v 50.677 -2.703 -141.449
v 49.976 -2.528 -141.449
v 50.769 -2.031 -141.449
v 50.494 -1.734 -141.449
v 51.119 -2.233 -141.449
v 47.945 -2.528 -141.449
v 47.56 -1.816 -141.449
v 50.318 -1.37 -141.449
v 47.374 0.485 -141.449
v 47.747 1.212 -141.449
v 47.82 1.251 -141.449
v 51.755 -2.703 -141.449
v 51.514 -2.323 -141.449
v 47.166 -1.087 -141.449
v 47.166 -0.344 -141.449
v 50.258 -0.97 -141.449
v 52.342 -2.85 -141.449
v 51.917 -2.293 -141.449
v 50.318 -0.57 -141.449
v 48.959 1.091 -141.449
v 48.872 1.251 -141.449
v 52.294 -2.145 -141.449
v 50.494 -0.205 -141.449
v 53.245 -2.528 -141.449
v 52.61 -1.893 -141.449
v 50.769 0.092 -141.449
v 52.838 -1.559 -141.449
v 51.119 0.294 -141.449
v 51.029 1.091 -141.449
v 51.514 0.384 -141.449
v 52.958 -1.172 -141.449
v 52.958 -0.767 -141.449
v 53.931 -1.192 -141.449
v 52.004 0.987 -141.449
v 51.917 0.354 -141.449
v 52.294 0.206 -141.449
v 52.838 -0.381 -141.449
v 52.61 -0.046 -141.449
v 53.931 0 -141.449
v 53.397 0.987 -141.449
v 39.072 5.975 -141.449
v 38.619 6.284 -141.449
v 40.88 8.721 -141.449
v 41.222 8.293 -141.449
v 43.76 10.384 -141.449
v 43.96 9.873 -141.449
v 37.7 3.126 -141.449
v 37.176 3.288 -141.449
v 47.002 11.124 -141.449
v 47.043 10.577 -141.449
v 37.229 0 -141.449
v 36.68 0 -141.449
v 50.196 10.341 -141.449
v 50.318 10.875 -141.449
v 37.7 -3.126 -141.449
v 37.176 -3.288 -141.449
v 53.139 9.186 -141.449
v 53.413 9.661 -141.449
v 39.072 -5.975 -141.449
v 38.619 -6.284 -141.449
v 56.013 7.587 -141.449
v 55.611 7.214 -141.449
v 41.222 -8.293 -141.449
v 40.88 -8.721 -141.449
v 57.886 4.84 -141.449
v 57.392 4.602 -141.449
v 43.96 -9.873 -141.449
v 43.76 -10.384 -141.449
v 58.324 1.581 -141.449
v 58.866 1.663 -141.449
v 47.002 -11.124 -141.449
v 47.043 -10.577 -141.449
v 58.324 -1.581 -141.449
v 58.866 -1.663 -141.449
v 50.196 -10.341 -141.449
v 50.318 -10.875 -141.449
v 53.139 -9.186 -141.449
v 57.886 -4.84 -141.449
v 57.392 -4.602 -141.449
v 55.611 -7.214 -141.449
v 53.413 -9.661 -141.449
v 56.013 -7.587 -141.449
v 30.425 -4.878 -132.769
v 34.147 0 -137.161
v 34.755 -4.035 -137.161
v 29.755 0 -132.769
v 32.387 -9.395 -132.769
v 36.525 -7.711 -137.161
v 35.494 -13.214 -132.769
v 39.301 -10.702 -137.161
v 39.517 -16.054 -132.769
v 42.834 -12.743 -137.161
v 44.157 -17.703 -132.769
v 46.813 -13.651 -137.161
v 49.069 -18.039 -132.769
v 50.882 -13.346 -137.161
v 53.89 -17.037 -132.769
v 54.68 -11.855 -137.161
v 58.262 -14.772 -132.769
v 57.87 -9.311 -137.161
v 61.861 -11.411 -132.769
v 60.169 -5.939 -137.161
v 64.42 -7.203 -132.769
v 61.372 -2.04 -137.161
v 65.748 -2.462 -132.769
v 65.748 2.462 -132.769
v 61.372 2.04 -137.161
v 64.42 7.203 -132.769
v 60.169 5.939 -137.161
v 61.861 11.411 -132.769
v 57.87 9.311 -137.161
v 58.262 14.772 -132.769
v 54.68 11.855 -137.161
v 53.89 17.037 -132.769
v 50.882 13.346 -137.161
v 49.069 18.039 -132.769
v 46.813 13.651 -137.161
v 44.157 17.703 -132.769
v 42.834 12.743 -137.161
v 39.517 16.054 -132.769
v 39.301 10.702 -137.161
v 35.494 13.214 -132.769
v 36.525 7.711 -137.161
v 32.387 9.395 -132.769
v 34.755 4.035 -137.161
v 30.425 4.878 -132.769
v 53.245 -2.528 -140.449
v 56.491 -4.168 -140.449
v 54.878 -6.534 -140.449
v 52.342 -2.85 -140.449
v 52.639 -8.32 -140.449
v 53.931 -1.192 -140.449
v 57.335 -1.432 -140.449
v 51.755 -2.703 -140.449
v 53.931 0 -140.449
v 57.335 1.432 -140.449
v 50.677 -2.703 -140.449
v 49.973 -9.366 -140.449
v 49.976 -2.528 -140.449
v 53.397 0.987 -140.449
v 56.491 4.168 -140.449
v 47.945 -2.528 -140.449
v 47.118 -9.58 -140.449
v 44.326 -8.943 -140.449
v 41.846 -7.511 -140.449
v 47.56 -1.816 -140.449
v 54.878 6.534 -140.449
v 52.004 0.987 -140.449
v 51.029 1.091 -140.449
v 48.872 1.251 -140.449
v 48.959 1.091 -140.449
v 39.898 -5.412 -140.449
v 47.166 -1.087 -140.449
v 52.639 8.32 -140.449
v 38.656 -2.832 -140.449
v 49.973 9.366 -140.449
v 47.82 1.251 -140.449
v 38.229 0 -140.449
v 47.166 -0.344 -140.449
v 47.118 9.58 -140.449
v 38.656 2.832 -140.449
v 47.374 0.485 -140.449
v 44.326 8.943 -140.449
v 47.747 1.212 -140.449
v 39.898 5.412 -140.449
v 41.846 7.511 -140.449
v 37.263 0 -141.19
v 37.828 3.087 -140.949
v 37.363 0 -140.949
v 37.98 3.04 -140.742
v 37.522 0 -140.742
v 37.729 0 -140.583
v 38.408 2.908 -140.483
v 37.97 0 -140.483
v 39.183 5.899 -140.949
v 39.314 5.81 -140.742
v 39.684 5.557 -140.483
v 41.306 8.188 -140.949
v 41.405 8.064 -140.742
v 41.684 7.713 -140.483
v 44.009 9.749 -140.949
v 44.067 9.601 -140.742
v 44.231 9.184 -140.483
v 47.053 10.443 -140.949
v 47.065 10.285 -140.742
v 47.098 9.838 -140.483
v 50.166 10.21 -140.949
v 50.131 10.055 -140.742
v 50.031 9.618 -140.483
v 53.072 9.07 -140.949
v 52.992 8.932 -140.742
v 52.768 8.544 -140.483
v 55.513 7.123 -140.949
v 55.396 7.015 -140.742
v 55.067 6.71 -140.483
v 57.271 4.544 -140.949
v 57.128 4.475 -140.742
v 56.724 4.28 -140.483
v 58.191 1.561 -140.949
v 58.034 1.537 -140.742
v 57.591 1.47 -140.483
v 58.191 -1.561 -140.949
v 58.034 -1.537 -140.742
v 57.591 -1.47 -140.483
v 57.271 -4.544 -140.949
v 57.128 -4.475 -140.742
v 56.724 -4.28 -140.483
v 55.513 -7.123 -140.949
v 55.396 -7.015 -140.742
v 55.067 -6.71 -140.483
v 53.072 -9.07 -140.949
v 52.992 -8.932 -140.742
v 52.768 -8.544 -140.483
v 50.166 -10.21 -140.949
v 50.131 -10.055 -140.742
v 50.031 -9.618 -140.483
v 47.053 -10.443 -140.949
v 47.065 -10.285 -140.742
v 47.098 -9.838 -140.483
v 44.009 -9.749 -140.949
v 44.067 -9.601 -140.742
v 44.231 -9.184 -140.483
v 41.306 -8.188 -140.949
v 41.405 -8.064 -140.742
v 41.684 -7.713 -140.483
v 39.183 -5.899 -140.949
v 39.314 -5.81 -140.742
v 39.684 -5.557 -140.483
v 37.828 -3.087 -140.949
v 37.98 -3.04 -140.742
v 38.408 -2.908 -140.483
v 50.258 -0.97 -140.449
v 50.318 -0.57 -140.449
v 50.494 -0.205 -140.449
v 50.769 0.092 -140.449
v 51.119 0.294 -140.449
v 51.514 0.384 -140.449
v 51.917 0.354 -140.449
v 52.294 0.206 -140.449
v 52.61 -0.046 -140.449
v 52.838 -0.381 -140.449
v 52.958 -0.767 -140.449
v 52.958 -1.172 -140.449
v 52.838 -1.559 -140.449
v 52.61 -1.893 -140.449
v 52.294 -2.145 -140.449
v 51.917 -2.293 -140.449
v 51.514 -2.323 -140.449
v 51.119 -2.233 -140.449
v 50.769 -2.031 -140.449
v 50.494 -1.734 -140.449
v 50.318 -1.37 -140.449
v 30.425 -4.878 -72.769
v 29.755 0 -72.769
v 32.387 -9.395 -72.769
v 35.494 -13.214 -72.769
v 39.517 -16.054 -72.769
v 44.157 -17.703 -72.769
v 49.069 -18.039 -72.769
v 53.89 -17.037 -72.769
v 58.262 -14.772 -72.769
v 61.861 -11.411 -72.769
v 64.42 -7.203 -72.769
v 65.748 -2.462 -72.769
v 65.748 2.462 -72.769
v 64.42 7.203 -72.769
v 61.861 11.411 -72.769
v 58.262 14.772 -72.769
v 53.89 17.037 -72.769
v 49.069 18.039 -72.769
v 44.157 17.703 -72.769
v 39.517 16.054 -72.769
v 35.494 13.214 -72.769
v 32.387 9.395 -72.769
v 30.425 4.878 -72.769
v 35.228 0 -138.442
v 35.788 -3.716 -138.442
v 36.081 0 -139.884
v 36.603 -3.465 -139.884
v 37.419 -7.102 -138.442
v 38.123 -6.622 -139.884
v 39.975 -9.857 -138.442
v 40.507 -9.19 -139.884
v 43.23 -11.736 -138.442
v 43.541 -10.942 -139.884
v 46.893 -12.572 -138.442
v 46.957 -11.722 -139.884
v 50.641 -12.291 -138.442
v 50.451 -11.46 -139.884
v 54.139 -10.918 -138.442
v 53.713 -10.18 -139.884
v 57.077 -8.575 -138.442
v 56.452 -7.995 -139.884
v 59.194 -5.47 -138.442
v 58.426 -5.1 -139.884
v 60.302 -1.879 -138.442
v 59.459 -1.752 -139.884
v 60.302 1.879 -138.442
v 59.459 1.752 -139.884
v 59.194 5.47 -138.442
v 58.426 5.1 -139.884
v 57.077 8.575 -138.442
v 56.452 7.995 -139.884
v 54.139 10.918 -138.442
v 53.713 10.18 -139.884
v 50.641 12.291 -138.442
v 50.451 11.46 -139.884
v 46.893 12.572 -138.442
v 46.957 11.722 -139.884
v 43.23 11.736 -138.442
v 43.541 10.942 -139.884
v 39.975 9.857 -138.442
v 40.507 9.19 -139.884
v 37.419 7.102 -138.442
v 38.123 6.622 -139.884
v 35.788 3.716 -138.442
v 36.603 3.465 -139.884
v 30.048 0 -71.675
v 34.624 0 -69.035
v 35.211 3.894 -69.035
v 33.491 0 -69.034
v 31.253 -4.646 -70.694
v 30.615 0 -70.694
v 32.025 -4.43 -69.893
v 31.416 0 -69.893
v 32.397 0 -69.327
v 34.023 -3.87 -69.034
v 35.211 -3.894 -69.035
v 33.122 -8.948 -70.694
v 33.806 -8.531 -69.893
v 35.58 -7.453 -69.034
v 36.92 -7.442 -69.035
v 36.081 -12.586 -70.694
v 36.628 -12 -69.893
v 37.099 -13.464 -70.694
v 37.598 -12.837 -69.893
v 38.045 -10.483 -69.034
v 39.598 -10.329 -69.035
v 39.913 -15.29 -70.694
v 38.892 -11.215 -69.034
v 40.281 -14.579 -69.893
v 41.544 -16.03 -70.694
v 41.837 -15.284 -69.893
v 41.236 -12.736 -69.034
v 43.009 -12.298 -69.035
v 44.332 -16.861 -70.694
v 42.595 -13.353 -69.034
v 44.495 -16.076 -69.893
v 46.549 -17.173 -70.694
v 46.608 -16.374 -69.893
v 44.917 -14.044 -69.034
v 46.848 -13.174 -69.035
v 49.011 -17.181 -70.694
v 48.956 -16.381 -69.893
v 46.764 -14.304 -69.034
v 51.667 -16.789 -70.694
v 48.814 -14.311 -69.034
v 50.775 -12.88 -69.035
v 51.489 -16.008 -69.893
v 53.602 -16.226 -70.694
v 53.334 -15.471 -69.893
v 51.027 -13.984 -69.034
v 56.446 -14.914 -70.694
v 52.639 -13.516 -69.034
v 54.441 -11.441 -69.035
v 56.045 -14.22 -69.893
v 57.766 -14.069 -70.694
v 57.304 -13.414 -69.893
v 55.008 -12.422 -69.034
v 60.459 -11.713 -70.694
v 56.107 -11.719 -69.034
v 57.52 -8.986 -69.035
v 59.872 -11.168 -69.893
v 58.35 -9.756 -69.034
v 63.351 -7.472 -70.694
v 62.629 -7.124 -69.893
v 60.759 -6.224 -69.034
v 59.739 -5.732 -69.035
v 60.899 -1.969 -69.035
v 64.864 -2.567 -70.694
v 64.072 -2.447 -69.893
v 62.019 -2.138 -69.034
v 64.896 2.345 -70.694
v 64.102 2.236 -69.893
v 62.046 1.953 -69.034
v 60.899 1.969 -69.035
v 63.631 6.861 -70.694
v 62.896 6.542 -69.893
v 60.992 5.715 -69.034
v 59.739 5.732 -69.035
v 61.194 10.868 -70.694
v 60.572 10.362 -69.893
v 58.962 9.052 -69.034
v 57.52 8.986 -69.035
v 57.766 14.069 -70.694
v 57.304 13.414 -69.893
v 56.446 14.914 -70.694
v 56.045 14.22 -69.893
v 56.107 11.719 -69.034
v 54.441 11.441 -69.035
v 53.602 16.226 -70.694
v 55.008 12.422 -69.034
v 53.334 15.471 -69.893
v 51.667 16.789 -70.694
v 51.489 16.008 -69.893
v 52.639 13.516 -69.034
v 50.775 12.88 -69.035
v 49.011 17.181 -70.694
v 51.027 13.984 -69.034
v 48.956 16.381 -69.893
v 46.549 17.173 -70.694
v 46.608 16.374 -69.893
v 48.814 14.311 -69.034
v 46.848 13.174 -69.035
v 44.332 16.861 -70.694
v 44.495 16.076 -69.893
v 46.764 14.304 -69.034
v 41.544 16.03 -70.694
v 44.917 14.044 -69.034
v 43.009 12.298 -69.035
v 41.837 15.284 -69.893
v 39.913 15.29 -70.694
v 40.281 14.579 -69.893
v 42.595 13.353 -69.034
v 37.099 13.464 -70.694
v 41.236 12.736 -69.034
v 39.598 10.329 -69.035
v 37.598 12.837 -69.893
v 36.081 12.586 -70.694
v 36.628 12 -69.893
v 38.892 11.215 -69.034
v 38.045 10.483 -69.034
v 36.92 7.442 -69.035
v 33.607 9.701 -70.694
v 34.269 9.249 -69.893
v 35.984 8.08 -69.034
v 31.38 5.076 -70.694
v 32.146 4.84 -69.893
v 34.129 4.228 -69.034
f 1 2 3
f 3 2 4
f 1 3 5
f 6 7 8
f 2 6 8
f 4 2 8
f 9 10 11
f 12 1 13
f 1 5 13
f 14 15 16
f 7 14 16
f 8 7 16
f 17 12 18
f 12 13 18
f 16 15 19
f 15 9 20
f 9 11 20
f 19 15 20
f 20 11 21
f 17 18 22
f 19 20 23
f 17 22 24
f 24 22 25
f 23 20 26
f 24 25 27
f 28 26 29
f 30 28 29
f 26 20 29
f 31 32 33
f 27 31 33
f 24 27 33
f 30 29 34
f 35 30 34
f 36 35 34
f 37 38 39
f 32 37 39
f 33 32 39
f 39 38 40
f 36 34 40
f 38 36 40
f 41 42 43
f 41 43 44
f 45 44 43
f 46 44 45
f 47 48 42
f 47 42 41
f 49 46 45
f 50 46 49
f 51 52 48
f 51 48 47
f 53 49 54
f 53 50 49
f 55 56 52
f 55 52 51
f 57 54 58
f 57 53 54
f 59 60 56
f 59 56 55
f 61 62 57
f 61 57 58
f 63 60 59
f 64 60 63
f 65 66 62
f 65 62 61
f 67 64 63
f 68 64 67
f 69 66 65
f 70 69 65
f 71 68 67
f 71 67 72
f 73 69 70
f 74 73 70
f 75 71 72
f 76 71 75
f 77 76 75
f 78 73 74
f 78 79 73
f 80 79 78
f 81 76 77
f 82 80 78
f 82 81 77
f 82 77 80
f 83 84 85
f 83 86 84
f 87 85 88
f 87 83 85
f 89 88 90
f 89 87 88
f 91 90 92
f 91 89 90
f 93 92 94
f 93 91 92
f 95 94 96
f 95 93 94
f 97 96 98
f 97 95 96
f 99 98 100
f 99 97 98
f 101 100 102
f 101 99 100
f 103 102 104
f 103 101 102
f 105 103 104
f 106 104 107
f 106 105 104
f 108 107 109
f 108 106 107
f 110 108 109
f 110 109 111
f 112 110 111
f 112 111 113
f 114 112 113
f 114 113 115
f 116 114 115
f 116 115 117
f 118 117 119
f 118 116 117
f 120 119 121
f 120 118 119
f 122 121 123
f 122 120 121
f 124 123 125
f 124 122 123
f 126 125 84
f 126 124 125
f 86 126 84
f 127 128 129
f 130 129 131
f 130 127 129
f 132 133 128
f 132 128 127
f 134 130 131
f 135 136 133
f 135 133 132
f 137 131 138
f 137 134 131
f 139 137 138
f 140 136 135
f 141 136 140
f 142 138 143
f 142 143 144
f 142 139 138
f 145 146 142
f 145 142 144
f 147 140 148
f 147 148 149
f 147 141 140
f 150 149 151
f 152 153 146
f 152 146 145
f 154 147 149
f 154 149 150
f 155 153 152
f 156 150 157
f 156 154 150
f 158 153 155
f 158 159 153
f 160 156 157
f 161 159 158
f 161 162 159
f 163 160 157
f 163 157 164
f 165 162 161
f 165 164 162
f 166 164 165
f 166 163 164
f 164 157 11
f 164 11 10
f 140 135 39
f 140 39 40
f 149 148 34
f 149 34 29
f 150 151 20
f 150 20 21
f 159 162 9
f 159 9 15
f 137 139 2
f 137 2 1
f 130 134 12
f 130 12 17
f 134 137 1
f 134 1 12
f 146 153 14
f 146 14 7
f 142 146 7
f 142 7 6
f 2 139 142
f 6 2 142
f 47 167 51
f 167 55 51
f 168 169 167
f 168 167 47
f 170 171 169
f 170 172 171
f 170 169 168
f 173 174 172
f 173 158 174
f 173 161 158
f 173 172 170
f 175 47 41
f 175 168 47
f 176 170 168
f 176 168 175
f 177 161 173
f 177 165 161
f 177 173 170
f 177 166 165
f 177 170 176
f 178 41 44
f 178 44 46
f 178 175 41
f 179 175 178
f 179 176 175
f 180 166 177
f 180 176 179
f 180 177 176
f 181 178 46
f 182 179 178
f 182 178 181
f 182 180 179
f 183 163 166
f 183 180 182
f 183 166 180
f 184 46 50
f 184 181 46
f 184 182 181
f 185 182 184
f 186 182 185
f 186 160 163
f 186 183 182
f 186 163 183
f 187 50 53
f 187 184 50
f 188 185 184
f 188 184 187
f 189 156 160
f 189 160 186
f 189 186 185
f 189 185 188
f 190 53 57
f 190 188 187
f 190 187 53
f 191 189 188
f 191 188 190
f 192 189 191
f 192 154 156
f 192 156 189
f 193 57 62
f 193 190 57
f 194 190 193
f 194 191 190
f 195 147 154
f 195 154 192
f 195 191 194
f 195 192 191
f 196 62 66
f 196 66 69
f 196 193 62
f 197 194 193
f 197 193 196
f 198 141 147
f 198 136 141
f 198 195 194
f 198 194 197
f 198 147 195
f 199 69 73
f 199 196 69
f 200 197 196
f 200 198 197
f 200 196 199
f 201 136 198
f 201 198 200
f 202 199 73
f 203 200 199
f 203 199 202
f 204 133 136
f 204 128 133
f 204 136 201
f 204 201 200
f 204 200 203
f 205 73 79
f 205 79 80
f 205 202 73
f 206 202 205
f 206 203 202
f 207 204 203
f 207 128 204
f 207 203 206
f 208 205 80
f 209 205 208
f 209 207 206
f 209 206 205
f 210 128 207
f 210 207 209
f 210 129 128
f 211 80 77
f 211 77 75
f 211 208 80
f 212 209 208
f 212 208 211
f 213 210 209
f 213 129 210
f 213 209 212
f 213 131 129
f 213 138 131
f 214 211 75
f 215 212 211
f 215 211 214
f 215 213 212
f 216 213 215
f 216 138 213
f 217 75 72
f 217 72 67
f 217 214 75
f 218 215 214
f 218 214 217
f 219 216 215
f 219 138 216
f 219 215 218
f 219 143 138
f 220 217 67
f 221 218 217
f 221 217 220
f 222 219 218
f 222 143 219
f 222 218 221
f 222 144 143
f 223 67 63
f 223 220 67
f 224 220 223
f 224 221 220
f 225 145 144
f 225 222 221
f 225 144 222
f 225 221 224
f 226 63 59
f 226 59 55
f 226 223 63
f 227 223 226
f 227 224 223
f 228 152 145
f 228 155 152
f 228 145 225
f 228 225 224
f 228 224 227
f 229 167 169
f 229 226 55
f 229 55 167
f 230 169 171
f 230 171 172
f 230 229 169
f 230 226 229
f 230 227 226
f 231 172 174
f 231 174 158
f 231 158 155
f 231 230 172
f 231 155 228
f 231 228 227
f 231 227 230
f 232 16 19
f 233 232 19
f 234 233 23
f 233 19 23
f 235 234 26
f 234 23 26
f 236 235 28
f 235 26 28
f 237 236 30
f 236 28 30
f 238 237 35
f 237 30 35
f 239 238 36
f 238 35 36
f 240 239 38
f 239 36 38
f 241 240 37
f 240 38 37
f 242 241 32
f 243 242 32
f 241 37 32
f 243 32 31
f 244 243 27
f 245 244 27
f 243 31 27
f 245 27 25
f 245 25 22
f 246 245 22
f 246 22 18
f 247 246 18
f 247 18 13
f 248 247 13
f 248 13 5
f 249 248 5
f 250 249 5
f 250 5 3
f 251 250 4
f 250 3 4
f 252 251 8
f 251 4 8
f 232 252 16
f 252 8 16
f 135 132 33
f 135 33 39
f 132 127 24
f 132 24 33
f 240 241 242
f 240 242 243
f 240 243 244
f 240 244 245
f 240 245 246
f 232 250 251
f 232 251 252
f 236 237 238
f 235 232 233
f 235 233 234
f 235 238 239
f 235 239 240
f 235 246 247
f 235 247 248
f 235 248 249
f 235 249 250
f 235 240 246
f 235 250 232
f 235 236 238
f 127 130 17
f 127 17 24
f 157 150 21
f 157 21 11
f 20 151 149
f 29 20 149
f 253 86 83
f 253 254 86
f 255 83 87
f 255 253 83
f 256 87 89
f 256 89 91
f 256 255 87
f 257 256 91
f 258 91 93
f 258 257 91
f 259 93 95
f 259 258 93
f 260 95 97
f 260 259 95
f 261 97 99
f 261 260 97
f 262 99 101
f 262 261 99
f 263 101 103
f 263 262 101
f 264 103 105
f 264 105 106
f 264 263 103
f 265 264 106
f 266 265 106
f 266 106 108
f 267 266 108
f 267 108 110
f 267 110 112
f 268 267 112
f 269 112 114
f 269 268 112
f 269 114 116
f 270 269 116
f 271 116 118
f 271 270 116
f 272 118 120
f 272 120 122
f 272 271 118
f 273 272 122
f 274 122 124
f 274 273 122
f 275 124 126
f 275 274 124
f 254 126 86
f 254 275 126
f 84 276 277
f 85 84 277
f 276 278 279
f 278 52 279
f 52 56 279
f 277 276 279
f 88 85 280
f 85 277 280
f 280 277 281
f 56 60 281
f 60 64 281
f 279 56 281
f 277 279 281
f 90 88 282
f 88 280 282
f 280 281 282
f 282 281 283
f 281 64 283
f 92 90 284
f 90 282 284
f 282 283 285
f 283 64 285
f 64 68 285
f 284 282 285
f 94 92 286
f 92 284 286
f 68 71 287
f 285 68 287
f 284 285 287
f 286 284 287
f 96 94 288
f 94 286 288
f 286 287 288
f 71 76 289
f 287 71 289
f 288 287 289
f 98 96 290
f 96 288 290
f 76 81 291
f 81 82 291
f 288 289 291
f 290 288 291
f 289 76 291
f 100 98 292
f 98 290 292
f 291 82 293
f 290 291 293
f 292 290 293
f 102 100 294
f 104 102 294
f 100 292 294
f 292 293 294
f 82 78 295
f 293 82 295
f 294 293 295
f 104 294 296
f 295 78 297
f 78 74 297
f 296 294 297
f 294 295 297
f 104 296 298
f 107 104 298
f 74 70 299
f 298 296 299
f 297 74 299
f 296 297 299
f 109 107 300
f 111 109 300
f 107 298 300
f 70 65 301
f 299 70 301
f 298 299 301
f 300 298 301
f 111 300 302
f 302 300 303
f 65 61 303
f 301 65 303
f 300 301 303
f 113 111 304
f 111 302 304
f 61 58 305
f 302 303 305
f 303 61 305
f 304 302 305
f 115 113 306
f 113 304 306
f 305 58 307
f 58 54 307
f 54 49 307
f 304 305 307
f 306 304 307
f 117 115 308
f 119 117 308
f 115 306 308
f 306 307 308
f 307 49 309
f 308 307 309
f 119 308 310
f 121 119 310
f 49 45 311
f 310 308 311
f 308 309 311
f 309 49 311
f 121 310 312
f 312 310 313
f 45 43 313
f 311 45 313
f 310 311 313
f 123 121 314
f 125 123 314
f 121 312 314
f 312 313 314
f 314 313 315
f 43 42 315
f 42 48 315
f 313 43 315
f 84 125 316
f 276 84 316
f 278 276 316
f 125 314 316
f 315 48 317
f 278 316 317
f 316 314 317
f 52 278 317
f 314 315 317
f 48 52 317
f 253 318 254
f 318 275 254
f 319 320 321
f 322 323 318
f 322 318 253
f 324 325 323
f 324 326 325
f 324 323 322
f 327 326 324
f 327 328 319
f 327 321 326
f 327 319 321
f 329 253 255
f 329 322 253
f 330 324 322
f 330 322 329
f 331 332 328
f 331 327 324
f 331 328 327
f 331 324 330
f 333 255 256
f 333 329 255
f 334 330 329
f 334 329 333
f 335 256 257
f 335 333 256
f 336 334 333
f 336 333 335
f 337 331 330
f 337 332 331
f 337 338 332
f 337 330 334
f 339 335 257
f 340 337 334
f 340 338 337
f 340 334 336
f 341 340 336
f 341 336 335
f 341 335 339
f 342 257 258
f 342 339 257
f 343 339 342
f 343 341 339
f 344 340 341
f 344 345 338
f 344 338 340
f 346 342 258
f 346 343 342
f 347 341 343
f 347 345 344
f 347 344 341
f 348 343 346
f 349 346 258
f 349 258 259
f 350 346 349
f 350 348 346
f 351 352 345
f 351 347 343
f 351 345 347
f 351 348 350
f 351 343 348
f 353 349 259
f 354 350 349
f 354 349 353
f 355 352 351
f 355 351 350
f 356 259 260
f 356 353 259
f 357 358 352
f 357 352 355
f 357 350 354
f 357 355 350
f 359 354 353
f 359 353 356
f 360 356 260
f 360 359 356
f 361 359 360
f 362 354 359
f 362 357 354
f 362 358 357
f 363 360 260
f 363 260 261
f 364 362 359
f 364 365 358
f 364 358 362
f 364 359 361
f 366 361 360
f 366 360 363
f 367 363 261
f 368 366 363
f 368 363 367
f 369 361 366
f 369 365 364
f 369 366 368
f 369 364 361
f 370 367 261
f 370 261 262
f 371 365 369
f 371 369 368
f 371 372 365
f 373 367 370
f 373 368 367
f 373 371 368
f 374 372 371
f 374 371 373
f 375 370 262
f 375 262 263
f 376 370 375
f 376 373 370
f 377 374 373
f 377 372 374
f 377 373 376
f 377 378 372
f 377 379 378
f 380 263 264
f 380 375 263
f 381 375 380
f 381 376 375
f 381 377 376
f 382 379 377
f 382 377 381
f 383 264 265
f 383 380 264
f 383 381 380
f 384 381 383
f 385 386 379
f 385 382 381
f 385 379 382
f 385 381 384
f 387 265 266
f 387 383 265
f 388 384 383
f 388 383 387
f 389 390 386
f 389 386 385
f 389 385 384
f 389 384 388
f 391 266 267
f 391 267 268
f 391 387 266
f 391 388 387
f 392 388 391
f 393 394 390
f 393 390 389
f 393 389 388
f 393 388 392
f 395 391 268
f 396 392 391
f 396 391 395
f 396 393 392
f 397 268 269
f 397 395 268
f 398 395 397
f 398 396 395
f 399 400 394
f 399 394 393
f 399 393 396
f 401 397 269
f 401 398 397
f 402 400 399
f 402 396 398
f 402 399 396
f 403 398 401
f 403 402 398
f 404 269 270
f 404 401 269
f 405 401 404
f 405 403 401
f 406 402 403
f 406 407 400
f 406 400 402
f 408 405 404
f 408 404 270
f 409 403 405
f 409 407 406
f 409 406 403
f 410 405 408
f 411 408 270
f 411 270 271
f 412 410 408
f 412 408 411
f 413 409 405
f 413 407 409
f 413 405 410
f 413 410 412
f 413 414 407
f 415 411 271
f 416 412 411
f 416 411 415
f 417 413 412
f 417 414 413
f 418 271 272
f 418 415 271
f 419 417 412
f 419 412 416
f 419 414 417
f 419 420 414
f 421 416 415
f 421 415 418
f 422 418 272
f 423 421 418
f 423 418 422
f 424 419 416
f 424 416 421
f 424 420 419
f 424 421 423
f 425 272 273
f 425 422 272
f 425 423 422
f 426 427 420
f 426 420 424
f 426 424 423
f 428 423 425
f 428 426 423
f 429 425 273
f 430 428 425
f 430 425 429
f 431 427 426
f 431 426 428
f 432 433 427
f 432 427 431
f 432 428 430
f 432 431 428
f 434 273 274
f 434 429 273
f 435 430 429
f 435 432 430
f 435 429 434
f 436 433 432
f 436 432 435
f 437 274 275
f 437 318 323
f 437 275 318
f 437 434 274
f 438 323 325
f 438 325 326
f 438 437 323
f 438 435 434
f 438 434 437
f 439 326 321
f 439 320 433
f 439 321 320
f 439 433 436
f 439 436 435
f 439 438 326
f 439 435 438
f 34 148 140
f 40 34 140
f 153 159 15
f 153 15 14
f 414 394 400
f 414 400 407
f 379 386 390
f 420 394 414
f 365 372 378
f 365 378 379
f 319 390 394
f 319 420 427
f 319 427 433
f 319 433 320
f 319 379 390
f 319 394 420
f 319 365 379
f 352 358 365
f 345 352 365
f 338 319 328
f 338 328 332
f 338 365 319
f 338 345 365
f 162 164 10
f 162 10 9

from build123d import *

# Parameters (mm, degrees)
FILLET1_R           = 10
SKETCH3_R           = 10.606635926
CUT_EXTRUDE1_DEPTH  = 1
FILLET2_R           = 1
BOSS_EXTRUDE1_DEPTH = 1
SKETCH5_R           = 1.357466481
CUT_EXTRUDE2_DEPTH  = 1


# Some blends are built 0.0001 mm under size
with BuildPart() as part:
    # Sketch2 → Revolve1 (revolve)
    with BuildSketch(Plane(origin=(0, 0, 0), x_dir=(1, 0, 0), z_dir=(0, 1, 0))):
        with BuildLine():
            Line((47.835513338, 141.44915936), (36.680360926, 141.44915936))
            Line((36.680360926, 141.44915936), (36.680360926, 139.695253367))
            Line((36.680360926, 139.695253367), (29.754604349, 132.769496791))
            Line((29.754604349, 132.769496791), (29.754604349, 72.768696414))
            ThreePointArc((29.754604349, 72.768696414), (31.416045745, 69.893157133), (34.624175548, 69.034660285))
            Line((34.624175548, 69.034660285), (47.835513338, 69.034660285))
            Line((47.835513338, 69.034660285), (47.835513338, 141.44915936))
        make_face()
    revolve(axis=Axis((47.835513338, 0, -141.44915936), (0, 0, 1)))

    # Fillet1
    # the kernel refuses this fillet: 10 mm, written as the material it adds along each edge
    with BuildSketch(Plane(origin=(47.835513338, 0, -139.695253367), x_dir=(-1, 0, 0), z_dir=(0, 1, 0))) as fillet1_piece_1:
        with BuildLine():
            CenterArc((20.759977074, -4.537310962), FILLET1_R, 135, 28.838814676)
            Line((13.688909262, 2.533756849), (13.547487906, 2.675178206))
            Line((13.547487906, 2.675178206), (11.013731056, 0.141421356))
            Line((11.013731056, 0.141421356), (10.955152412, 0))
            ThreePointArc((10.955152412, 0), (10.955152412, -0.876952996), (10.963055919, -1.698237893))
            Line((10.963055919, -1.698237893), (11.155152412, -1.753905993))
        make_face()
    revolve(axis=Axis((47.835513338, 0, -139.695253367), (0, 0, 1)))

    # Sketch3 → Cut-Extrude1 (cut)
    with BuildSketch(Plane(origin=(0, 0, -141.44915936), x_dir=(-1, 0, 0), z_dir=(0, 0, -1))):
        with Locations((-47.835513338, 0)):
            Circle(SKETCH3_R)
    extrude(amount=-CUT_EXTRUDE1_DEPTH, mode=Mode.SUBTRACT)

    # Fillet2
    fillet2_edges = [part.edges().sort_by_distance(p)[0] for p in [
        (58.442149264, 0, -140.44915936),
    ]]
    fillet(fillet2_edges, radius=FILLET2_R - 0.0001)  # a hair under: the kernel refuses the full size

    # Sketch4 → Boss-Extrude1 (add)
    with BuildSketch(Plane(origin=(0, 0, -140.44915936), x_dir=(-1, 0, 0), z_dir=(0, 0, -1))):
        Polygon((-53.244860259, -2.527826931), (-53.930670857, -1.191951097), (-53.930670857, 0), (-53.39712733, 0.986747489), (-52.726937837, 0.986747489), (-52.00416544, 0.986747489), (-51.028572962, 1.090883539), (-49.975577249, 1.090883539), (-48.95869179, 1.090883539), (-48.872046113, 1.251128017), (-47.819832156, 1.251128017), (-47.746875393, 1.211679618), (-47.373781513, 0.484938009), (-47.166149857, -0.344127446), (-47.166149857, -1.087168011), (-47.560328453, -1.81617084), (-47.945127508, -2.527826931), (-48.375815512, -2.527826931), (-49.1103871, -2.527826931), (-49.975577249, -2.527826931), (-50.676613698, -2.703394925), (-51.754528733, -2.703394925), (-52.341537829, -2.85040584), align=None)
    extrude(amount=BOSS_EXTRUDE1_DEPTH)

    # Sketch5 → Cut-Extrude2 (cut)
    with BuildSketch(Plane(origin=(0, 0, -141.44915936), x_dir=(-1, 0, 0), z_dir=(0, 0, -1))):
        with Locations((-51.615276347, -0.969807614)):
            Circle(SKETCH5_R)
    extrude(amount=-CUT_EXTRUDE2_DEPTH, mode=Mode.SUBTRACT)


solid = part.part
